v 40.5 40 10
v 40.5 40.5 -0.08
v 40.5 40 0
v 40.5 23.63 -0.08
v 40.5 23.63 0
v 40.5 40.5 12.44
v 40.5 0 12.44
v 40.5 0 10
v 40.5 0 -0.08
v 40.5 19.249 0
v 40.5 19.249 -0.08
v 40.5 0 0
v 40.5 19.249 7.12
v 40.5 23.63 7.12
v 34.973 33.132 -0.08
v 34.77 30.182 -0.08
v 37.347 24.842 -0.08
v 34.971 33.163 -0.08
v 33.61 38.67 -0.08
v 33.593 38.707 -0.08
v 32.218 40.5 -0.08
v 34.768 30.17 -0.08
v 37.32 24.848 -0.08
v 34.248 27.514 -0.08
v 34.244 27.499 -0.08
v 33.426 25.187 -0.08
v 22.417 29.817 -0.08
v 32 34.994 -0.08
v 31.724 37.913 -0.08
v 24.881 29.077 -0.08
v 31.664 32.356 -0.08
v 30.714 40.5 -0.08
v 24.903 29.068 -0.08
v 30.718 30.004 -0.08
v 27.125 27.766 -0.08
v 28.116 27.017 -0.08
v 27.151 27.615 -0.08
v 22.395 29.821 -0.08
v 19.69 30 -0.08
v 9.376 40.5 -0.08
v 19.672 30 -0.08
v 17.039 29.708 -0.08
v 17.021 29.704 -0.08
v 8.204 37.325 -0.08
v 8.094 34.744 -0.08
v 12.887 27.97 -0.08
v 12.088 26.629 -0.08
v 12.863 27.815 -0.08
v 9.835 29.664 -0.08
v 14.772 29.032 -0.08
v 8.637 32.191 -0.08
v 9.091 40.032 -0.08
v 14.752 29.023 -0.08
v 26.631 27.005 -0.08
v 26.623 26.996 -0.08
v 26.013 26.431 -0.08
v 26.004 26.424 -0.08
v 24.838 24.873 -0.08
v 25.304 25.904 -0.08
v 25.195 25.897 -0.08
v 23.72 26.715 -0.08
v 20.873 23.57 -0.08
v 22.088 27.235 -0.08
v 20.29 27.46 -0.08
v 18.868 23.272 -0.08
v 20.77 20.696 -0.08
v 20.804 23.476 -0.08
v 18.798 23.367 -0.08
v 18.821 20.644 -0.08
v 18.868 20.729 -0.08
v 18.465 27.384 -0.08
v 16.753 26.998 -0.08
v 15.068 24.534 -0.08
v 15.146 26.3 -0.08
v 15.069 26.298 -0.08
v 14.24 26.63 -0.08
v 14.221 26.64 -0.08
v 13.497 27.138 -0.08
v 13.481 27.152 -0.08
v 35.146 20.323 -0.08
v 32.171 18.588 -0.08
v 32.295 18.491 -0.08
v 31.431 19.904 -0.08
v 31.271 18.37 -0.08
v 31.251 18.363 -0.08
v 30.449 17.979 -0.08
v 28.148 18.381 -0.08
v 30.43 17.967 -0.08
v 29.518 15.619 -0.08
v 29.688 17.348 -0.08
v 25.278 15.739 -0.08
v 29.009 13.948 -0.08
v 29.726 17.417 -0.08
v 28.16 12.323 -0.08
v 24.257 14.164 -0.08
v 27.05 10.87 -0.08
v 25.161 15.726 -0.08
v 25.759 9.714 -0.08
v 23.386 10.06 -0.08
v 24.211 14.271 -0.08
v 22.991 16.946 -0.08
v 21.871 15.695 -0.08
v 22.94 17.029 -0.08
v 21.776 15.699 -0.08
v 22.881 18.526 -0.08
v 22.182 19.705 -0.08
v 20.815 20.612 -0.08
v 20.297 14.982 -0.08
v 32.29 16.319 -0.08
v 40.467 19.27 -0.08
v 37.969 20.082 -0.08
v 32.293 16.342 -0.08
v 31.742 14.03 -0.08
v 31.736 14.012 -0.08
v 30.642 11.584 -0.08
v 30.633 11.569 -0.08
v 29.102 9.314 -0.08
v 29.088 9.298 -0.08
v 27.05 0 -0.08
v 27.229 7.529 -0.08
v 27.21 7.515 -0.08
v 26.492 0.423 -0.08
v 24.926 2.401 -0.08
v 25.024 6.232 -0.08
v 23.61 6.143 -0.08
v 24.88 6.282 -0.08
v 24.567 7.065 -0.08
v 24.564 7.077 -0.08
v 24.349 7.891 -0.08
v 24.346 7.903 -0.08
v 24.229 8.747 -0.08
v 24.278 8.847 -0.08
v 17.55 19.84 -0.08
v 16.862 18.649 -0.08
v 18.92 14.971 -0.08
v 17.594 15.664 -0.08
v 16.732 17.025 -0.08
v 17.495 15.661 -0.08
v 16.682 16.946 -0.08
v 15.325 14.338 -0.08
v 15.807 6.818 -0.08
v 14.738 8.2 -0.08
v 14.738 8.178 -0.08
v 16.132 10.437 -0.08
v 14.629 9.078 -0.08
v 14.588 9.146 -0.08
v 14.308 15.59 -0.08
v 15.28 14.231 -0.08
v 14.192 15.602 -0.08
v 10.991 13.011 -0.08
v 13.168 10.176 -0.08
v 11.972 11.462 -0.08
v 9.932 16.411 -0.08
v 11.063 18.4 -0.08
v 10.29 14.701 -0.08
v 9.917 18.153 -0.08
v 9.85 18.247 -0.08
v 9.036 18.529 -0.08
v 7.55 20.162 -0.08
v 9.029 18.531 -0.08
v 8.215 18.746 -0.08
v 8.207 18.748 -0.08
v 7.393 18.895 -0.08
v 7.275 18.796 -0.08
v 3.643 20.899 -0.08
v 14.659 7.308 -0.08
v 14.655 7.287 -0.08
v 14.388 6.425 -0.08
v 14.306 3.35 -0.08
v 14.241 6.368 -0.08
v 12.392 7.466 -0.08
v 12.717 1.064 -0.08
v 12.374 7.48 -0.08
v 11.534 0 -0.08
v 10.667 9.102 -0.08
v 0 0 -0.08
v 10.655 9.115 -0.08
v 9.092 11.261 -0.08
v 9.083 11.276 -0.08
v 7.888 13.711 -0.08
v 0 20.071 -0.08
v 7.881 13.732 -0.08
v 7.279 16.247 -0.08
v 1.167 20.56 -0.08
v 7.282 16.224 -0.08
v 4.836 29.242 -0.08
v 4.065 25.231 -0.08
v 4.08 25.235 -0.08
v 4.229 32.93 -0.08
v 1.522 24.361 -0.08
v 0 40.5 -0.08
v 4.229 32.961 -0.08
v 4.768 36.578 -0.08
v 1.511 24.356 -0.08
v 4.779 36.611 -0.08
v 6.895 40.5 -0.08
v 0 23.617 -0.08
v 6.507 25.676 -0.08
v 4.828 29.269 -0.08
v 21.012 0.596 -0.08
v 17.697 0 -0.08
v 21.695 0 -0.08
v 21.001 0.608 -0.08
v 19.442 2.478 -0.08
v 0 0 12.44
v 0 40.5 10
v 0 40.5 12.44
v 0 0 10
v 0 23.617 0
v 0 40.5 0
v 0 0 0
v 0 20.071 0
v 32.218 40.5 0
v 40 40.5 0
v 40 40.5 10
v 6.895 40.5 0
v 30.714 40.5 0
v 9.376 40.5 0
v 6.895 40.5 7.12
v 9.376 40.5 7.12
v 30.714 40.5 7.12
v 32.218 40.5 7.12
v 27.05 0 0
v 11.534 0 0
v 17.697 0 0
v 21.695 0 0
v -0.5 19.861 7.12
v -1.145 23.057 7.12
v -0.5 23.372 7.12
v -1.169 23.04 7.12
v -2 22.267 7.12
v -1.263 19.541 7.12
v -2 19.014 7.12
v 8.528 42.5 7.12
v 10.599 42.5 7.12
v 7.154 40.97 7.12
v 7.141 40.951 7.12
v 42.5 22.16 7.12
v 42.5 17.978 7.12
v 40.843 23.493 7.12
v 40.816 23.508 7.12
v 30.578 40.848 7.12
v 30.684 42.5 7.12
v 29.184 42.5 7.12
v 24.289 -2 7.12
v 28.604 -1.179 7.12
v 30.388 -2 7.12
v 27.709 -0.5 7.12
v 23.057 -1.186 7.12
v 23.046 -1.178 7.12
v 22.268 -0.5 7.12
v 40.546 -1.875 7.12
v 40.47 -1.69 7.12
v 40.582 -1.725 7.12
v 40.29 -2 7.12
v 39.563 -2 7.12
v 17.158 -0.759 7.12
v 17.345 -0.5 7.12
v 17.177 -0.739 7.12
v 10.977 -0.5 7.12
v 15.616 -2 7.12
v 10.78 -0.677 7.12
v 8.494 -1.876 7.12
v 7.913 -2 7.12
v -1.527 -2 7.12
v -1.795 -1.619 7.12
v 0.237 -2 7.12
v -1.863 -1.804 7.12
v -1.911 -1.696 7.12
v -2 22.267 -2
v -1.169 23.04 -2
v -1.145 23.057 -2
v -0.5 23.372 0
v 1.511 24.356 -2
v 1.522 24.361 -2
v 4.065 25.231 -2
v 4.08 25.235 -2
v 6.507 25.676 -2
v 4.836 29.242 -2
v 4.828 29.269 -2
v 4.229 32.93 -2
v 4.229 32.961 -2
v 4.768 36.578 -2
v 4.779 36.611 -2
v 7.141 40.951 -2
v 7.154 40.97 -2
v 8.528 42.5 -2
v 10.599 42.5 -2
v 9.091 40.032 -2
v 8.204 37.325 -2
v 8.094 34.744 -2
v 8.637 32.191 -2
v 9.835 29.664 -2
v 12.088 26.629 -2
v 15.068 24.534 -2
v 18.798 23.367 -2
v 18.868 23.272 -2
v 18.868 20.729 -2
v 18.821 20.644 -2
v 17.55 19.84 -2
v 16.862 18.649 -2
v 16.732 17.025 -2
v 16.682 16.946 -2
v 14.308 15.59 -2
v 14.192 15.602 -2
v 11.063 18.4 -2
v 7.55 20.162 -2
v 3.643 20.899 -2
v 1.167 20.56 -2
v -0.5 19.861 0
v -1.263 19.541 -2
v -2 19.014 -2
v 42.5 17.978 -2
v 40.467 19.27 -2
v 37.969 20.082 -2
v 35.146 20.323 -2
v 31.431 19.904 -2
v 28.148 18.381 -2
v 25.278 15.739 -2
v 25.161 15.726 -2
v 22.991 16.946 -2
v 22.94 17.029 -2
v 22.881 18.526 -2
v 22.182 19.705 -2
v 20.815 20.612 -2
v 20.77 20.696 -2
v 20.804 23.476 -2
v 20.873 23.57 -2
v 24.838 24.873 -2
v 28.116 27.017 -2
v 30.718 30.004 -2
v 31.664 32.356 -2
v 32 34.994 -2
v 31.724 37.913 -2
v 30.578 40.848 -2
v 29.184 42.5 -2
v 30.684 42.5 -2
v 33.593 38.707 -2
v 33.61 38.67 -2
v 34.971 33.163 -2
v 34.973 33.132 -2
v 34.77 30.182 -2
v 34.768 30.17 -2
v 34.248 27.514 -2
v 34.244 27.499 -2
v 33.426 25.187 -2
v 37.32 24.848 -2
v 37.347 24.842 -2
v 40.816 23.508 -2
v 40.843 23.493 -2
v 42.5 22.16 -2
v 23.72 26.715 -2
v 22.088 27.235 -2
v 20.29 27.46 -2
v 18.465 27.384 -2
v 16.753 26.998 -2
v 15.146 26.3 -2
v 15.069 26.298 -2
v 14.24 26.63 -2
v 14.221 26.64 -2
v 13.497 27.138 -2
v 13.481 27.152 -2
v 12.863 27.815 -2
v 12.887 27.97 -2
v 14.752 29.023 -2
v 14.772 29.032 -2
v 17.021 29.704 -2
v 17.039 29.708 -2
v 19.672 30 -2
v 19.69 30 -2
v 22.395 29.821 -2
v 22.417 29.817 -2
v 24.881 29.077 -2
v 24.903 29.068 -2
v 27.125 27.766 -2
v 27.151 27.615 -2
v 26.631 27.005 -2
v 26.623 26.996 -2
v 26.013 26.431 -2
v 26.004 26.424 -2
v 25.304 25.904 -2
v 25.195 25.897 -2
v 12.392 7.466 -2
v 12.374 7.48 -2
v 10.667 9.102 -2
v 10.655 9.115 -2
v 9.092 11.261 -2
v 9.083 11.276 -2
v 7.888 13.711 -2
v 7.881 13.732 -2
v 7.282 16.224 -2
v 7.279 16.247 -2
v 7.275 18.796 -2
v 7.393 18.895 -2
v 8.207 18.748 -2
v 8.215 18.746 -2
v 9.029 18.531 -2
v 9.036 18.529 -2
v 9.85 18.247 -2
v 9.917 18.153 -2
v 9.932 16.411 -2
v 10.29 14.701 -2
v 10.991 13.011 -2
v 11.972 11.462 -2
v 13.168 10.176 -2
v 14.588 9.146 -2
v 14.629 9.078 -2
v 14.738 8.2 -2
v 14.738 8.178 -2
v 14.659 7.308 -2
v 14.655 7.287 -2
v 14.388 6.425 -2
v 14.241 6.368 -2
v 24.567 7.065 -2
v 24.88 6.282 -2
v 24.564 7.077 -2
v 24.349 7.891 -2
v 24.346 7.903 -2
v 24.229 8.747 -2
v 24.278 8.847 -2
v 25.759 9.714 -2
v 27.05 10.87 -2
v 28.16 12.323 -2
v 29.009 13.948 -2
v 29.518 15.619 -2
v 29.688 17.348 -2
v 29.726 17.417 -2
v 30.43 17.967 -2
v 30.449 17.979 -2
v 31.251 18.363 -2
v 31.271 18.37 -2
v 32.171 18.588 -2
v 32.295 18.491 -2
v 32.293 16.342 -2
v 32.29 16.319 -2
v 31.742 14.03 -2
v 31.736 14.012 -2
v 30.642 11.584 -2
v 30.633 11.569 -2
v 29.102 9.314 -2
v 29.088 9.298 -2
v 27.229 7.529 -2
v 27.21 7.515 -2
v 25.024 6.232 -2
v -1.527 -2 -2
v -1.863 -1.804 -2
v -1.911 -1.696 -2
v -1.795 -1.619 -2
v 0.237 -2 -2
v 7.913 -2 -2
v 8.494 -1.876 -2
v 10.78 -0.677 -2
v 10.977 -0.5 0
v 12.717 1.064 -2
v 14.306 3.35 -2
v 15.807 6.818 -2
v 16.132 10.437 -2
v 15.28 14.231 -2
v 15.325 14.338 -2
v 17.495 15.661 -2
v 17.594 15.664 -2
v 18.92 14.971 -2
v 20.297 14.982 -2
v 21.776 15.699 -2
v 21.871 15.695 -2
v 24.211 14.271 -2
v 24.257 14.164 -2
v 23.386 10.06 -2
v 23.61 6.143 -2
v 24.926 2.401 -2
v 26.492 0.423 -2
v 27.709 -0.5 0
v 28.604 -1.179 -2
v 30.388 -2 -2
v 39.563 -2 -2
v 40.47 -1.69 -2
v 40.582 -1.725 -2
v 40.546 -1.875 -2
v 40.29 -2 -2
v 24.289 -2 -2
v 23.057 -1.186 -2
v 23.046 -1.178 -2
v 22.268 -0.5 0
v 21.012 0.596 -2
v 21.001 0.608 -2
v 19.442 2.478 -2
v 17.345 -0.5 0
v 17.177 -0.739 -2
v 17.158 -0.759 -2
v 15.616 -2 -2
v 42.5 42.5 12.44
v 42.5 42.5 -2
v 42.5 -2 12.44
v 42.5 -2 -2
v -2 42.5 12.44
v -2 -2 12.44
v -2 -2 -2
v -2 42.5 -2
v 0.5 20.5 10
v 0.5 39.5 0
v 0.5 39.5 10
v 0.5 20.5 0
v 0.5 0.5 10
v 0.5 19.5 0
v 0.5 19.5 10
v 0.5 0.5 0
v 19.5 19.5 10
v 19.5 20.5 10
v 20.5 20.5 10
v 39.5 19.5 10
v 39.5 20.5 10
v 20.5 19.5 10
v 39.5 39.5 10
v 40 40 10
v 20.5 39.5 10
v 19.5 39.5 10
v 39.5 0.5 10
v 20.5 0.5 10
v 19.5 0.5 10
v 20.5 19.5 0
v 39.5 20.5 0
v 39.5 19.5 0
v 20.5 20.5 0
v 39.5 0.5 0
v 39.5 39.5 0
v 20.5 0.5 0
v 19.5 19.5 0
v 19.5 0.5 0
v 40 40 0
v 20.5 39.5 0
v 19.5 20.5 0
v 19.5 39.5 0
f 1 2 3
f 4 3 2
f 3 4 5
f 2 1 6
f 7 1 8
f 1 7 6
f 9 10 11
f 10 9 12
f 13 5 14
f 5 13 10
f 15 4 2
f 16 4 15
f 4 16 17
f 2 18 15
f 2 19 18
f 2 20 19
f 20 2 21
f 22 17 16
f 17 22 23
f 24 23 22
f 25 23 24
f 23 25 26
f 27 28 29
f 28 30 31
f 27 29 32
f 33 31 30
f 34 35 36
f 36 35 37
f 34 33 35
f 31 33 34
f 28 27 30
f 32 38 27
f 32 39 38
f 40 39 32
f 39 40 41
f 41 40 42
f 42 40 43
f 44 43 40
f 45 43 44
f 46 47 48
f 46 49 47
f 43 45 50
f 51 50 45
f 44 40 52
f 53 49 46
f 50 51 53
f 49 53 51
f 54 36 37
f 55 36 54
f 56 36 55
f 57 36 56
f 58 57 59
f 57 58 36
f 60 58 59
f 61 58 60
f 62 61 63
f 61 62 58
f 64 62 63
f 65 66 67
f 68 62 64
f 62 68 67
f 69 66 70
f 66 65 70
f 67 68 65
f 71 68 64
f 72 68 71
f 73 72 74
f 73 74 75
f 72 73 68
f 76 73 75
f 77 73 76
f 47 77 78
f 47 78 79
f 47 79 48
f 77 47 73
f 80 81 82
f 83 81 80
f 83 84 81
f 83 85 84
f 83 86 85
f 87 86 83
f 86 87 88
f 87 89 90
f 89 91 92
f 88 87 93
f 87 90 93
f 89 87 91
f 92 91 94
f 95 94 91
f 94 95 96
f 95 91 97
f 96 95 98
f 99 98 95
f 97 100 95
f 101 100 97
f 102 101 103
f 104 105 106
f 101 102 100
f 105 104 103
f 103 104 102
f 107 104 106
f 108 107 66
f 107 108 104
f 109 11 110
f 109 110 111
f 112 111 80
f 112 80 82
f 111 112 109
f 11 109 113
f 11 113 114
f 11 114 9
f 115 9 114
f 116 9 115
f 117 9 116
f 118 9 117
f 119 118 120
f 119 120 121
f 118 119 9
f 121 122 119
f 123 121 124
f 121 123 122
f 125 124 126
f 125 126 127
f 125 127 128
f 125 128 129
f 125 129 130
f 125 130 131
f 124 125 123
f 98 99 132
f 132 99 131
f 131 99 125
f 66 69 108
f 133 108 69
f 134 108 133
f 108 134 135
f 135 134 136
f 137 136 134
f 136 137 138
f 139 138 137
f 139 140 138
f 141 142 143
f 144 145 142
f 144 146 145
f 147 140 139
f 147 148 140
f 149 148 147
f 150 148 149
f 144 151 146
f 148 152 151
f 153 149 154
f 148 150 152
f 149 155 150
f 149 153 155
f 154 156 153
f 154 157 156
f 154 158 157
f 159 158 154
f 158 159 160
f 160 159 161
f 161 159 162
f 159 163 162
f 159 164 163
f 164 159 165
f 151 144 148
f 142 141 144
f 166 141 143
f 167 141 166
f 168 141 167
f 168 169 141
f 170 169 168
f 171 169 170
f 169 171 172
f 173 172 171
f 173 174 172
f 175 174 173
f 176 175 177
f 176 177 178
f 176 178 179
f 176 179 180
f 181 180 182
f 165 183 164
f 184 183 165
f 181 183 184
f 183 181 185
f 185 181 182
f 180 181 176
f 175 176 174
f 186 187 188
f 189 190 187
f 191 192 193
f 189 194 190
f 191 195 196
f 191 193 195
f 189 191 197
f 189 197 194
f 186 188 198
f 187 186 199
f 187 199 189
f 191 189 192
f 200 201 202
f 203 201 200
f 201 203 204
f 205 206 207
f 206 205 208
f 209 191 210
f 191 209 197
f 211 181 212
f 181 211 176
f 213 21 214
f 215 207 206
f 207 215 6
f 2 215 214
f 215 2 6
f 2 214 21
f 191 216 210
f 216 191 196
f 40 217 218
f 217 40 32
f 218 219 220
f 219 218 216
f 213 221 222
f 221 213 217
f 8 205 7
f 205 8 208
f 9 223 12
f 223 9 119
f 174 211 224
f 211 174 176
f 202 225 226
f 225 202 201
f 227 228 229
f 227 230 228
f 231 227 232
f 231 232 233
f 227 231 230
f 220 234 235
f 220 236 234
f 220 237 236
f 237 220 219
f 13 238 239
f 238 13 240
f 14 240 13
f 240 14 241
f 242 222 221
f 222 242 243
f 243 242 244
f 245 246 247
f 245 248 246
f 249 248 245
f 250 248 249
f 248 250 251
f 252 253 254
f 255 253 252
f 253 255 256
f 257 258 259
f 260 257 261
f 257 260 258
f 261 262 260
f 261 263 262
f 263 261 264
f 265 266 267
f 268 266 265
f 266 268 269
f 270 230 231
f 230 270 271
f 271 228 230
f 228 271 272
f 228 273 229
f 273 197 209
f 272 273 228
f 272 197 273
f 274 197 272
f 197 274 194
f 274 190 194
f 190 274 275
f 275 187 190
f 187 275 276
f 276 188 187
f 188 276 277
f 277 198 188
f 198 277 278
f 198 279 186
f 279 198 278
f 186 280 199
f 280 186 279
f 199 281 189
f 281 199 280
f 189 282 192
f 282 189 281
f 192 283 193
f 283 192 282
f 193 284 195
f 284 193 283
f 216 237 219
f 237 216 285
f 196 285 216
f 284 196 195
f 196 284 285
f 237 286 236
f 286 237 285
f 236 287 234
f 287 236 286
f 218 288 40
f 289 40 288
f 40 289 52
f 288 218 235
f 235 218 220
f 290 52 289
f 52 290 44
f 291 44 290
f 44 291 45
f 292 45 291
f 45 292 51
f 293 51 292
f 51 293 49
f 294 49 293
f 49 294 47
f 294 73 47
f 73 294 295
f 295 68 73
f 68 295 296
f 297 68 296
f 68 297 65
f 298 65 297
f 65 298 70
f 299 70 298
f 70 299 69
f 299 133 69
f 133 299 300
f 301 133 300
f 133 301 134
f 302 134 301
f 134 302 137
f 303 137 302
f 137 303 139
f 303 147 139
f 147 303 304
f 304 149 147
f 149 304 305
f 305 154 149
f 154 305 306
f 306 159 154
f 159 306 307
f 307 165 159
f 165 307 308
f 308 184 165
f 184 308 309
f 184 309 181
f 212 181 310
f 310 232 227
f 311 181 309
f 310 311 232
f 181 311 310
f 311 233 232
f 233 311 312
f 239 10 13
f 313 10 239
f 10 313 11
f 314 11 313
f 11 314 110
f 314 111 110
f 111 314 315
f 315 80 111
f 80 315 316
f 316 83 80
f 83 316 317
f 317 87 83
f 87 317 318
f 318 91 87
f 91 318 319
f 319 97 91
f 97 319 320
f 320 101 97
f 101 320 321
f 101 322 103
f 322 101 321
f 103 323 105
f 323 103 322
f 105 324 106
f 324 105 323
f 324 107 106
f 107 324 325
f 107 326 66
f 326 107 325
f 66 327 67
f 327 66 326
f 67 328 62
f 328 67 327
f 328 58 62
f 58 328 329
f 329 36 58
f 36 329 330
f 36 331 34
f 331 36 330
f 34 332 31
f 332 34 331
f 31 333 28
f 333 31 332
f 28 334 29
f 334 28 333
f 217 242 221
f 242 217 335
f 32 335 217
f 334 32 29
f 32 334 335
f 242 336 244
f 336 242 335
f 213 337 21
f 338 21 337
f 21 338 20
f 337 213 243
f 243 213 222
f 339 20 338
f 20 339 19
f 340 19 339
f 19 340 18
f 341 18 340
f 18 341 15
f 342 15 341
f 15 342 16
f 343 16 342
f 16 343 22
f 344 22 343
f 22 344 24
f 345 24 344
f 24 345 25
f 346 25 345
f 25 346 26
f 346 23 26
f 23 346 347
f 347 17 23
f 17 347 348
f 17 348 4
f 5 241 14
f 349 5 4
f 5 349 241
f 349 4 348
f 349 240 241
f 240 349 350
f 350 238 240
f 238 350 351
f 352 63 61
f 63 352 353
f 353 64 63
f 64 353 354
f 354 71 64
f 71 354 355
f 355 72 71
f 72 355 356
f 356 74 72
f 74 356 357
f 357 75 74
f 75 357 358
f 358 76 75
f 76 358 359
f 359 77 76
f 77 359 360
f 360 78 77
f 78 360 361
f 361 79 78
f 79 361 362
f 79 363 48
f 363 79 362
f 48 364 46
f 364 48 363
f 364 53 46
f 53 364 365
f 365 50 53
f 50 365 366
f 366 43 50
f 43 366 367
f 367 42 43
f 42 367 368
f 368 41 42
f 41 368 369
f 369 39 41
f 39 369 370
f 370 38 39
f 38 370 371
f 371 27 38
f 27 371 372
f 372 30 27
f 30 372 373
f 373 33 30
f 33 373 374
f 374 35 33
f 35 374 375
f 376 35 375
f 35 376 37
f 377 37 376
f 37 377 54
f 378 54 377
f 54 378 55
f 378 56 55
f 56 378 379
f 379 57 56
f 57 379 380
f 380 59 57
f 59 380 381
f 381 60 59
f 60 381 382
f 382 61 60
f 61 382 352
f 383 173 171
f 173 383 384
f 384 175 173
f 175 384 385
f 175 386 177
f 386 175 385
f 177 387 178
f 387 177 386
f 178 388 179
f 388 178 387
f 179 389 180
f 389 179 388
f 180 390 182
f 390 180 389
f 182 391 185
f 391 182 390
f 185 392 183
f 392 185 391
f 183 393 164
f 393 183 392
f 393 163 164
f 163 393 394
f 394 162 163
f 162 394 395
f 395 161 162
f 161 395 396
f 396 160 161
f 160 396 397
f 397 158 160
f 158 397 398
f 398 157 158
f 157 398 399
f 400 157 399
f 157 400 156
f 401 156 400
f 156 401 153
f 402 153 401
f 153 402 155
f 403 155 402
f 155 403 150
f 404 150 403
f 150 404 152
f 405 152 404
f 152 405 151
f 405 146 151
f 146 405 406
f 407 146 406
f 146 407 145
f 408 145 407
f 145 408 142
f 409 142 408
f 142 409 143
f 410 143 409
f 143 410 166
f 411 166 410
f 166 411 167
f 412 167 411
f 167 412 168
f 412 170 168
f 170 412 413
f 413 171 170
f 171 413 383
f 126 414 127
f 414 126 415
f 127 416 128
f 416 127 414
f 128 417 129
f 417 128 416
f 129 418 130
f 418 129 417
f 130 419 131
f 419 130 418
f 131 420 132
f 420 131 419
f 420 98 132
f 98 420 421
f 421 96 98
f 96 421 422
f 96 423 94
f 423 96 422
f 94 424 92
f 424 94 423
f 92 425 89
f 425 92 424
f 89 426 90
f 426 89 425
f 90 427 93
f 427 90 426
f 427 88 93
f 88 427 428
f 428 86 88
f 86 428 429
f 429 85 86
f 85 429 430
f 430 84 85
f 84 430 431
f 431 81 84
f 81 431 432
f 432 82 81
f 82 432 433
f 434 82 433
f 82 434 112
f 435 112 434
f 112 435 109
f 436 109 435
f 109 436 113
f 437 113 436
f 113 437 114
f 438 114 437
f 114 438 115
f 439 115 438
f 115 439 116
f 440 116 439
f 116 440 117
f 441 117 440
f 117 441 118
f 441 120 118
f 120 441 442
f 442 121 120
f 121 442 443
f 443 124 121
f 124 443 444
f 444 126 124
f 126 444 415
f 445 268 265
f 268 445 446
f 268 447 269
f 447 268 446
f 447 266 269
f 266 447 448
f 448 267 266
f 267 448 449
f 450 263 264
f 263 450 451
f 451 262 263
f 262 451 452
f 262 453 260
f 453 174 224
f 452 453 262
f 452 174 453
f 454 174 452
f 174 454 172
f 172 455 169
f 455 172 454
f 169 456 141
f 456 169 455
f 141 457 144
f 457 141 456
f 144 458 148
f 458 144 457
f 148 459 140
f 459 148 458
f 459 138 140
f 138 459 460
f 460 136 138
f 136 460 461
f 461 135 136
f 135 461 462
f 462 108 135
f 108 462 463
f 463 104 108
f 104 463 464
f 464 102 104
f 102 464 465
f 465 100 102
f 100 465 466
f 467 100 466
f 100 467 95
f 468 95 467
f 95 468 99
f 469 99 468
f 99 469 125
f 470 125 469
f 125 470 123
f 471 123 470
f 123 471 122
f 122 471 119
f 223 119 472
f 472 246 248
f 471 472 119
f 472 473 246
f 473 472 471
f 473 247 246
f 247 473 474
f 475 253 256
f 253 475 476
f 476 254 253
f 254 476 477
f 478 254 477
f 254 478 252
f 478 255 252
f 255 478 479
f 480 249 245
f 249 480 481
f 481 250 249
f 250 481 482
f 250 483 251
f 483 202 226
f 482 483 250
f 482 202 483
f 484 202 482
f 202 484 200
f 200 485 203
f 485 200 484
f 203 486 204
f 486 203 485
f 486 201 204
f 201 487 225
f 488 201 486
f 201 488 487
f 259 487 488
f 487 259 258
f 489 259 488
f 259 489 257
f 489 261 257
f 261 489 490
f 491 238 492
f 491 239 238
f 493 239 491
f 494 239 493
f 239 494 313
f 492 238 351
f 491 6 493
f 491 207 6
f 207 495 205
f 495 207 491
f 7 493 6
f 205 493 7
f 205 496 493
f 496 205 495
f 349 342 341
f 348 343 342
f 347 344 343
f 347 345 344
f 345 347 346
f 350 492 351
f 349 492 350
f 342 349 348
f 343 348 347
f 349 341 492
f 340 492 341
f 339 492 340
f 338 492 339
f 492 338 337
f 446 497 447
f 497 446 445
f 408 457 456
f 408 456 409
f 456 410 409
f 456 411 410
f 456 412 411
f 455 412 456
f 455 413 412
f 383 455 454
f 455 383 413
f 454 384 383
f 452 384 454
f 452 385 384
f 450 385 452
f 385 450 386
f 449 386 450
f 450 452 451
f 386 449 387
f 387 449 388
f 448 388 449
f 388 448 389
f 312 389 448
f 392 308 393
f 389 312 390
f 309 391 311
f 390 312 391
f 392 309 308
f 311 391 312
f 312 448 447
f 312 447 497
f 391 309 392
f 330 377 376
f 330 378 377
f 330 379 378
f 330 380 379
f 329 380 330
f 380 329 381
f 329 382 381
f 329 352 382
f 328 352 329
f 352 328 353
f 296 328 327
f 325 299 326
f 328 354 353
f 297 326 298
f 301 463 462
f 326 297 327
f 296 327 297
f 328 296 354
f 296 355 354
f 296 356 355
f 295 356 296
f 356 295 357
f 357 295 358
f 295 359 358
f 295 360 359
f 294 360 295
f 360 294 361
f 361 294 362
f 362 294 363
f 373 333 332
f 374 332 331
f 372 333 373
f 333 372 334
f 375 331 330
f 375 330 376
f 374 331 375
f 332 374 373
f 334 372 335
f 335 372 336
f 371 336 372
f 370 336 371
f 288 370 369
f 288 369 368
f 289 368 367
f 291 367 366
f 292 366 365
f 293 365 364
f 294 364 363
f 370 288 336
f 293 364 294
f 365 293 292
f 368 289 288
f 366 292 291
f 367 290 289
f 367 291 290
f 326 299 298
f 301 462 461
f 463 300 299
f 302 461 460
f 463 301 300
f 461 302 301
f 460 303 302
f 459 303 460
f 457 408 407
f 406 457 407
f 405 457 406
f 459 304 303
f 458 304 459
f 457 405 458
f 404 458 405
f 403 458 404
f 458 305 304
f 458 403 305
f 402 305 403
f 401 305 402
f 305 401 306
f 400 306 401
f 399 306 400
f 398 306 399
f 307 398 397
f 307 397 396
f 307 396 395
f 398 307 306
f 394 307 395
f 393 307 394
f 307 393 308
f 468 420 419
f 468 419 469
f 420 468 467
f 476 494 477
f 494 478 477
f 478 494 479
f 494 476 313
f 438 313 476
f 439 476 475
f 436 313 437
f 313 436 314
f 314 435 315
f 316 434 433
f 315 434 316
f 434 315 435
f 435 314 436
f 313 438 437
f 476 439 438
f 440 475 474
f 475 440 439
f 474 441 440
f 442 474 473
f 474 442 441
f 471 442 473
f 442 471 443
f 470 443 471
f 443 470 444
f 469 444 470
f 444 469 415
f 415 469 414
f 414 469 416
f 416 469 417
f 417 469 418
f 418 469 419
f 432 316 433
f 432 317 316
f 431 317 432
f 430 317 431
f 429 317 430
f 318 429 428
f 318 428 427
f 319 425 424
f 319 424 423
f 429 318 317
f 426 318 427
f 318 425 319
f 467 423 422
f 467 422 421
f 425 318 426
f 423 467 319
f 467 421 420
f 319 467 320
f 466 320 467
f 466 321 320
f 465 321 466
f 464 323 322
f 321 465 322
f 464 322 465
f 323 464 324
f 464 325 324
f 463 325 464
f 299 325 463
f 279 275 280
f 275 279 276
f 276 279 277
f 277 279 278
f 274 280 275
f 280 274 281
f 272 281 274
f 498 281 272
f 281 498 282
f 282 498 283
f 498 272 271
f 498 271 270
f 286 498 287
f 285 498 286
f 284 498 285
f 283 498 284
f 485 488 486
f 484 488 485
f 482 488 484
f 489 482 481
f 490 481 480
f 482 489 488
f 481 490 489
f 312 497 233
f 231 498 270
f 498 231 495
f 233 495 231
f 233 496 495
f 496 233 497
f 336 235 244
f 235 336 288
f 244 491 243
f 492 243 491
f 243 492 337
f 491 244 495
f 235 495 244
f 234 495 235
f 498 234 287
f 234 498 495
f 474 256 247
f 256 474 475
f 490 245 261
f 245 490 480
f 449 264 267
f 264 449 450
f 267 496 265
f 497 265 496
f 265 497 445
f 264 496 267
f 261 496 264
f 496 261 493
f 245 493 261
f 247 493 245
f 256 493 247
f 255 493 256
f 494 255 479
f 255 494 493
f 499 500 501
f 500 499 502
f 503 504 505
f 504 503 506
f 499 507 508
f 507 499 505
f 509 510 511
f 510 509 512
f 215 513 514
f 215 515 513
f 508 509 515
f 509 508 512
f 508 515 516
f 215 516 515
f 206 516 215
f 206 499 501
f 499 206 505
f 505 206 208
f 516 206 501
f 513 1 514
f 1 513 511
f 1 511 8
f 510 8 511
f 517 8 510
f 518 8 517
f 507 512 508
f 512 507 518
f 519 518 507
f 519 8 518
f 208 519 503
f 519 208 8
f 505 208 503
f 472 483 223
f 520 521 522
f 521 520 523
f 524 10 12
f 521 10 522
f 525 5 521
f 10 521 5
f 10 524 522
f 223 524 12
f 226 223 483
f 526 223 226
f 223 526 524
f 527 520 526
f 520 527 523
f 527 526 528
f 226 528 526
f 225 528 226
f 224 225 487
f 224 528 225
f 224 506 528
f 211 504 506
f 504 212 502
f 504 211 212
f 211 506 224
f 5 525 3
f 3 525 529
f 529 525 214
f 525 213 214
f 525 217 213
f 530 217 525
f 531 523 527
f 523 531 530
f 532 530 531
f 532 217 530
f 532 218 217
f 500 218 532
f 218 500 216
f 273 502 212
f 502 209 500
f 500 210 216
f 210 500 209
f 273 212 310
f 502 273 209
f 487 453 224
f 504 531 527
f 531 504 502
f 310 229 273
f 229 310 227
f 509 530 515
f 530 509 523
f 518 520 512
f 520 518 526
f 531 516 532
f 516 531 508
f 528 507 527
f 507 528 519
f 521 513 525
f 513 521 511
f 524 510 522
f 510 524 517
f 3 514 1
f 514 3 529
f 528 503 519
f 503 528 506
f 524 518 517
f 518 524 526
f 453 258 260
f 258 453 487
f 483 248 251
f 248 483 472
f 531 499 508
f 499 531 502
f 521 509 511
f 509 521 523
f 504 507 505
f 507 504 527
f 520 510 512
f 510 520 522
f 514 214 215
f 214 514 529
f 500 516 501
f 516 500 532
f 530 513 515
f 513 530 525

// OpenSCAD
// stix
nudge = 0.25;

// numBox = 11;

stixBoxW = 20;
stixBoxH = 20;

// stixW = numBox * stixBoxW + .25 + nudge;
stixWex = .25 + nudge;
stixHex = .25 + nudge;
stixH = stixBoxH + .25 + nudge;
stixD = 10; // 14;

textFont = "Arial Rounded MT Bold:style=Bold";
bioFont = "Menlo:style=Bold";

// for centerKind == 4 -- * == star, % == heart
// to support centers, use - for things like O, = for doubles like B
bioSize = 25;
letrSize = 19;
letrExpand = .1;

//centerText = "%%*DR%B*%%";
//textSupport = "   || |   ";
// centerText = "%MODDABLE%";

// textSupport = "  |||-|   ";

letterY = stixH / 2; // 5.4;
letterZ = 4.2;
letterXOffset = -.5;

letSupZ = 6.7; // 8;
supSize = .34;
supVMult = 1.25;
supDeep = 1.6;

wall = 2;
skinBreak = 0.01;

boardD = 1.53;
boardCapD = 3.52;
boardLedD = 2.44;

ledOffsetD = wall + boardLedD + stixD;

capW = 3.7;
capH = 2.9;
capD = boardCapD - boardD;

capX = 12.08 - capW;
capY = 6.89 - capH;
capZ = boardD;

ledW = 2;
ledH = 2;
ledD = boardLedD - boardD;

ledY = 5 - ledW / 2;
ledZ = boardD;

hartY = 4.8;
hartZ = -5;
hartXOffset = -.5;

starY = 5.4;
starZ = -5;
starXOffset = -.5;

module star(sz = 1, deep=ledOffsetD) {
scale([sz, sz, 1]) {
cX = 69.85 / 2;
cY = 68.58 / 2;

ztar = [
[33.02 -cX,68.32 -cY],
[36.70 -cX,68.32 -cY],
[44.07 -cX,43.56 -cY],
[68.20 -cX,44.83 -cY],
[69.47 -cX,40.00 -cY],
[49.02 -cX,26.80 -cY],
[59.82 -cX,3.30 -cY],
[55.75 -cX,0.00 -cY],
[34.93 -cX,16.38 -cY],
[14.99 -cX,0.00 -cY],
[11.05 -cX,2.67 -cY],
[21.08 -cX,26.67 -cY],
[0.00 -cX,40.89 -cY],
[2.54 -cX,46.23 -cY],
[26.80 -cX,43.94 -cY]];
    
    rotate([180,0,180])
    translate([0, 0, -deep/2])
            linear_extrude(height = deep, center=true)
                polygon(ztar);
}
}

module heart(sz=1, deep=ledOffsetD) {
rotate([0, 0, 180])
scale([sz, sz, 1]) {
    hTopR = 20;
    hY = -20;
    hInset = 1;
    
        translate([-hTopR+hInset, hY, 0])
            cylinder(r=hTopR, h=deep);
        translate([hTopR-hInset, hY, 0])
            cylinder(r=hTopR, h=deep);
            
     triPoly = [[ -hTopR*2+hInset+1.7, hY ], [hTopR*2-hInset-1.7, hY], [0, hY+hTopR*2.7]];
     
     sc = 1;
     cX = 0;
     cY = -8.3;
     
         translate([-cX, -cY, deep/2])
                linear_extrude(height = deep, center=true, scale=sc)
                    polygon(triPoly);
}
}

dsg = 0.4; // 0.5; // digitSegmentGap

module line(x1, y1, x2, y2, d=10, th=dsg) {
    linear_extrude(height=d) {
        // left
        hull() {
          translate([x1, y1]) circle(th);
          translate([x2, y2]) circle(th);
        }
    }
}

module letter(l, sz=1, deep=ledOffsetD, font=textFont) {
    echo ("letter:", l);
    rotate([0, 180, 0])
	linear_extrude(height = deep) {
        offset(r=letrExpand)
		text(l, size = sz, font = font, halign = "center", valign = "center", $fn = 16);
	}
}

module board(num) {
    stixW = stixBoxW * num + stixWex;
    cube([stixW, stixH, boardD]);
    translate([capX, capY, capZ])
        cube([capW, capH, capD]);
    for (a =[stixBoxW:stixBoxW:(num-1)*stixBoxW])
        translate([a, ledY, ledZ])
            cube([ledW, ledH, ledD]);
}

module corePos(num) {
    stixW = stixBoxW * num + stixWex;
    translate([-wall, -wall, -wall])
        cube([stixW + wall*2, stixH + wall*2, ledOffsetD]);
}

module coreNeg(num, text, textCenters) {
    zoff = 3;
    stixW = stixBoxW * num + stixWex;
    translate([0, 0, -zoff])
        cube([stixW, stixH, stixD+zoff]);
    for (a=[0:1:num-1]) {
        translate([(a*stixBoxW)+stixBoxW/2 -letterXOffset, letterY, letterZ]) {
            if (text[num-a-1] == "*") {
                translate([0, 0, -letterZ*3])
                star(0.013*stixBoxW);
            }
            else if (text[num-a-1] == "%") {
                translate([0, 0, -letterZ*3])
#                   heart(0.011*stixBoxW);
            }
            else if (text[num-a-1] == "☣")
                letter("☣", bioSize, ledOffsetD, bioFont);
            else {
                letter(text[num-a-1], letrSize);
            }
        }
    }
}

halfboxW = stixBoxW/2;

module supports(num, textCenters, deep=ledOffsetD) {
    for (a=[0:1:num-1]) {
        translate([(a*stixBoxW)+halfboxW -letterXOffset, letterY, letSupZ]) {
            if (textCenters[num-a-1] == "-") {
                translate([0, -1.8, -letterZ*2])
            #        line(-halfboxW, 0, halfboxW, 0, supDeep, supSize);
            }
            else if (textCenters[num-a-1] == "=") {
                translate([0, 0, -letterZ*2]) {
                    line(-halfboxW, 1.7, halfboxW, 1.7, supDeep, supSize);
                    line(-halfboxW, -1.7, halfboxW, -1.7, supDeep, supSize);
                }
            }
            else if (textCenters[num-a-1] == "|") {
                translate([0, 0, -letterZ*2]) 
                    line(0, -halfboxW, 0, halfboxW, supDeep, supSize*supVMult);
            }
        }
    }
}

dividerW = 1;

module coreDividers(num) {
    for (a=[stixBoxW:stixBoxW:num*stixBoxW-stixBoxW])
        translate([a, 0, 0])
            cube([dividerW, stixH, stixD]);
}

module core(num, text, textCenters) {
    difference() {
        corePos(num);
        translate([0, 0, wall + ledD + skinBreak])
            coreNeg(num, text, textCenters);
    }
    difference() {
        coreDividers(num);
        translate([capX, capY, capZ+6.2])
            cube([capW, capH, capD+1]);

    }
}

module gridPos(col, row) {
    stixW = stixBoxW * col + stixWex;
    stixH = stixBoxH * row + stixHex;
    translate([-wall, -wall, -wall])
        cube([stixW + wall*2, stixH + wall*2, ledOffsetD]);
}

module gridNeg(col, row, symbol, size) {
    zoff = 3;
    stixW = stixBoxW * col + stixWex;
    stixH = stixBoxH * row + stixHex;
    translate([0, 0, -zoff])
        cube([stixW, stixH, stixD+zoff]);
    translate([stixW/2 -letterXOffset, stixH/2, letterZ]) {
            if (symbol == "*") {
                translate([0, 0, -letterZ*3])
                star(0.013*stixBoxW);
            }
            else if (symbol == "%") {
                translate([0, 0, -letterZ*3])
#                   heart(0.011*stixBoxW);
            }
            else if (symbol == "☣")
                letter("☣", size, ledOffsetD, bioFont);
            else {
                letter(symbol, letrSize);
            }
        }
}

module grid(col, row, symbol, size, dividers = 0) {
    difference() {
        gridPos(col, row);
        translate([0, 0, wall + ledD + skinBreak])
            gridNeg(col, row, symbol, size);
    }
    dividerW = 1 + (dividers == 0 ? .5 : 0);
    difference() {
        union() {
            for (a=[0:1:col])
                translate([(a*stixBoxW)-(dividerW/2), 0, 0])
                    cube([dividerW, stixBoxH*row, stixD]);
            for (b=[0:1:row])
                translate([0, (b*stixBoxH)-(dividerW/2), 0])
                    cube([stixBoxW*col, dividerW, stixD]);
        }
        inset = 1.5;
        if (dividers == 0) {
            translate([dividerW/2+1, dividerW/2+inset, 0])
#                cube([stixBoxW*col-dividerW/2-2*inset, stixBoxH*row-dividerW/2-2*inset, stixD]);
   
        }
    }
}

module strip(num, text, textCenters) {
    union() {
        core(num, text, textCenters);
        supports(num, textCenters, 1);
    }
}

module stayCalm() {
    translate([0, -stixH-wall, 0])
        strip(5, "PANIC", "|-   ");
    strip (5, "DON’T", "||   ");
}

module twoBy() {
     grid(2, 2, "☣", 50, 1);

}

twoBy();
* stayCalm();
